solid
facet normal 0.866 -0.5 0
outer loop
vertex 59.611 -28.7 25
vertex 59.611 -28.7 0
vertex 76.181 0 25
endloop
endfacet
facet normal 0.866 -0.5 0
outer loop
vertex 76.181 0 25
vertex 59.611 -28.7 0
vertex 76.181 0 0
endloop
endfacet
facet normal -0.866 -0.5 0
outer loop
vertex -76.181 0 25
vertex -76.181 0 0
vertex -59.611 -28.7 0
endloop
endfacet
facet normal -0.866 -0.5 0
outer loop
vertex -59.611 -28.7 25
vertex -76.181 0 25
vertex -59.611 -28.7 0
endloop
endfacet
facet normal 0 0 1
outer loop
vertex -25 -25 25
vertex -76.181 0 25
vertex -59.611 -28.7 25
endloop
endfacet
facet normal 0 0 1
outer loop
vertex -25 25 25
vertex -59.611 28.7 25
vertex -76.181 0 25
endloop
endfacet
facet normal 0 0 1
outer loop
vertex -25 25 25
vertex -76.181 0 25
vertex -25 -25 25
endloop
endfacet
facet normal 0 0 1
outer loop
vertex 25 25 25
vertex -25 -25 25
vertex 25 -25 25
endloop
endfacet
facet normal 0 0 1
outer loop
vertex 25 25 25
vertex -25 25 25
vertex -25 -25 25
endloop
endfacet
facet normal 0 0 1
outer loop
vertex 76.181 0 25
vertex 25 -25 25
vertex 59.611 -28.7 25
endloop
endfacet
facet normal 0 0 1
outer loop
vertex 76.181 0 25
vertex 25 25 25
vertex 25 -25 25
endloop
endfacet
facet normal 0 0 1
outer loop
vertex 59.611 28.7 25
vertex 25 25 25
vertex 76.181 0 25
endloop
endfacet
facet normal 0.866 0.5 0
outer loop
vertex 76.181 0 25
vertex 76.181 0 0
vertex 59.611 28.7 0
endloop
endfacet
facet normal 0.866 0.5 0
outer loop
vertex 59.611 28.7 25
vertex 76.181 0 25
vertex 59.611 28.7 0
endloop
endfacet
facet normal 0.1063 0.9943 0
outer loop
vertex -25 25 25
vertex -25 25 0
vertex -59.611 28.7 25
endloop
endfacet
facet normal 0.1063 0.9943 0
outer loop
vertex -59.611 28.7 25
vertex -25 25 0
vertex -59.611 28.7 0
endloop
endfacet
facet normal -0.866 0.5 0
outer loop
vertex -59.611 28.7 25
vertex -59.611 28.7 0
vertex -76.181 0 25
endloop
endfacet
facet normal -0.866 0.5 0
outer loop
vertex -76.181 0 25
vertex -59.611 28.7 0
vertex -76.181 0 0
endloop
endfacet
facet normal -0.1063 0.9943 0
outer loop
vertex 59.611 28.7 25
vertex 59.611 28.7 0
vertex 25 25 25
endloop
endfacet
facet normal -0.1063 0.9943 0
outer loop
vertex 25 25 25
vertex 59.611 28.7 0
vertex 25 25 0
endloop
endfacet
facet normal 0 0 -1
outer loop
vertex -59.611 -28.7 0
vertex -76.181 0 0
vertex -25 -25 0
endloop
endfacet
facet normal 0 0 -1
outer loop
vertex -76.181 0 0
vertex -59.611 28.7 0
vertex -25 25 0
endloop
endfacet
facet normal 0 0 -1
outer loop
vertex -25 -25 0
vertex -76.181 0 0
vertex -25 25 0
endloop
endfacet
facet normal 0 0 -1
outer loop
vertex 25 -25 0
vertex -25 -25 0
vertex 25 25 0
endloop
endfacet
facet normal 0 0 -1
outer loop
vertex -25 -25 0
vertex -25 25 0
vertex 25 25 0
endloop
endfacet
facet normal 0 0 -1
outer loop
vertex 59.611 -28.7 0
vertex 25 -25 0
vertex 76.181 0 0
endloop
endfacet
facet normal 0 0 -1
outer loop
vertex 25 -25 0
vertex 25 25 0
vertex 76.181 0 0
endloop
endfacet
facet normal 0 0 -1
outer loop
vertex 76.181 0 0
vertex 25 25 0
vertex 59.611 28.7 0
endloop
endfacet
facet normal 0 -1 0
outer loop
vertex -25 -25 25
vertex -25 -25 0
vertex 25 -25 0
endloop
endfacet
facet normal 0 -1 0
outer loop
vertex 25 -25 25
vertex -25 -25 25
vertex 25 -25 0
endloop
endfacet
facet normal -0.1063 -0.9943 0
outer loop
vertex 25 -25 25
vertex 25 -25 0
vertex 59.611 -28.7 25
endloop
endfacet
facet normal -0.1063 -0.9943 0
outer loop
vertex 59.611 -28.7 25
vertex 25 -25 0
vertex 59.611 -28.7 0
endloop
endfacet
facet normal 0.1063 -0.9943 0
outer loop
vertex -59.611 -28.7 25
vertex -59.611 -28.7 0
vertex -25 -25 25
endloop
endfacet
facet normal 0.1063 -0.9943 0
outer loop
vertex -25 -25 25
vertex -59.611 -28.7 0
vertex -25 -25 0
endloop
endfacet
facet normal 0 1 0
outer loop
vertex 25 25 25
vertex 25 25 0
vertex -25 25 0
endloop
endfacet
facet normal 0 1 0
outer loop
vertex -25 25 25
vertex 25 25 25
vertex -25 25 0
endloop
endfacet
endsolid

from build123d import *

# Parameters (mm, degrees)
F1_DEPTH = 25


with BuildPart() as f1:
    # F0 (on Top) → F1 (new body)
    with BuildSketch(Plane.XY):
        Polygon((-59.6113632321, -28.6996493522), (-25, -25), (-25, 25), (-59.6113632321, 28.6996493522), (-76.1811135112, 0), align=None)
        Polygon((-9.9021123947, 0), (-24.3358691244, -25), (24.3358691244, -25), (9.9021123947, 0), (24.3358691244, 25), (-24.3358691244, 25), align=None)
        Polygon((-25, 25), (-25, -25), (-24.3358691244, -25), (-9.9021123947, 0), (-24.3358691244, 25), align=None)
        Polygon((9.9021123947, 0), (24.3358691244, -25), (25, -25), (25, 25), (24.3358691244, 25), align=None)
        Polygon((25, 25), (25, -25), (59.6113632321, -28.6996493522), (76.1811135112, 0), (59.6113632321, 28.6996493522), align=None)
    extrude(amount=F1_DEPTH)


solid = f1.part
